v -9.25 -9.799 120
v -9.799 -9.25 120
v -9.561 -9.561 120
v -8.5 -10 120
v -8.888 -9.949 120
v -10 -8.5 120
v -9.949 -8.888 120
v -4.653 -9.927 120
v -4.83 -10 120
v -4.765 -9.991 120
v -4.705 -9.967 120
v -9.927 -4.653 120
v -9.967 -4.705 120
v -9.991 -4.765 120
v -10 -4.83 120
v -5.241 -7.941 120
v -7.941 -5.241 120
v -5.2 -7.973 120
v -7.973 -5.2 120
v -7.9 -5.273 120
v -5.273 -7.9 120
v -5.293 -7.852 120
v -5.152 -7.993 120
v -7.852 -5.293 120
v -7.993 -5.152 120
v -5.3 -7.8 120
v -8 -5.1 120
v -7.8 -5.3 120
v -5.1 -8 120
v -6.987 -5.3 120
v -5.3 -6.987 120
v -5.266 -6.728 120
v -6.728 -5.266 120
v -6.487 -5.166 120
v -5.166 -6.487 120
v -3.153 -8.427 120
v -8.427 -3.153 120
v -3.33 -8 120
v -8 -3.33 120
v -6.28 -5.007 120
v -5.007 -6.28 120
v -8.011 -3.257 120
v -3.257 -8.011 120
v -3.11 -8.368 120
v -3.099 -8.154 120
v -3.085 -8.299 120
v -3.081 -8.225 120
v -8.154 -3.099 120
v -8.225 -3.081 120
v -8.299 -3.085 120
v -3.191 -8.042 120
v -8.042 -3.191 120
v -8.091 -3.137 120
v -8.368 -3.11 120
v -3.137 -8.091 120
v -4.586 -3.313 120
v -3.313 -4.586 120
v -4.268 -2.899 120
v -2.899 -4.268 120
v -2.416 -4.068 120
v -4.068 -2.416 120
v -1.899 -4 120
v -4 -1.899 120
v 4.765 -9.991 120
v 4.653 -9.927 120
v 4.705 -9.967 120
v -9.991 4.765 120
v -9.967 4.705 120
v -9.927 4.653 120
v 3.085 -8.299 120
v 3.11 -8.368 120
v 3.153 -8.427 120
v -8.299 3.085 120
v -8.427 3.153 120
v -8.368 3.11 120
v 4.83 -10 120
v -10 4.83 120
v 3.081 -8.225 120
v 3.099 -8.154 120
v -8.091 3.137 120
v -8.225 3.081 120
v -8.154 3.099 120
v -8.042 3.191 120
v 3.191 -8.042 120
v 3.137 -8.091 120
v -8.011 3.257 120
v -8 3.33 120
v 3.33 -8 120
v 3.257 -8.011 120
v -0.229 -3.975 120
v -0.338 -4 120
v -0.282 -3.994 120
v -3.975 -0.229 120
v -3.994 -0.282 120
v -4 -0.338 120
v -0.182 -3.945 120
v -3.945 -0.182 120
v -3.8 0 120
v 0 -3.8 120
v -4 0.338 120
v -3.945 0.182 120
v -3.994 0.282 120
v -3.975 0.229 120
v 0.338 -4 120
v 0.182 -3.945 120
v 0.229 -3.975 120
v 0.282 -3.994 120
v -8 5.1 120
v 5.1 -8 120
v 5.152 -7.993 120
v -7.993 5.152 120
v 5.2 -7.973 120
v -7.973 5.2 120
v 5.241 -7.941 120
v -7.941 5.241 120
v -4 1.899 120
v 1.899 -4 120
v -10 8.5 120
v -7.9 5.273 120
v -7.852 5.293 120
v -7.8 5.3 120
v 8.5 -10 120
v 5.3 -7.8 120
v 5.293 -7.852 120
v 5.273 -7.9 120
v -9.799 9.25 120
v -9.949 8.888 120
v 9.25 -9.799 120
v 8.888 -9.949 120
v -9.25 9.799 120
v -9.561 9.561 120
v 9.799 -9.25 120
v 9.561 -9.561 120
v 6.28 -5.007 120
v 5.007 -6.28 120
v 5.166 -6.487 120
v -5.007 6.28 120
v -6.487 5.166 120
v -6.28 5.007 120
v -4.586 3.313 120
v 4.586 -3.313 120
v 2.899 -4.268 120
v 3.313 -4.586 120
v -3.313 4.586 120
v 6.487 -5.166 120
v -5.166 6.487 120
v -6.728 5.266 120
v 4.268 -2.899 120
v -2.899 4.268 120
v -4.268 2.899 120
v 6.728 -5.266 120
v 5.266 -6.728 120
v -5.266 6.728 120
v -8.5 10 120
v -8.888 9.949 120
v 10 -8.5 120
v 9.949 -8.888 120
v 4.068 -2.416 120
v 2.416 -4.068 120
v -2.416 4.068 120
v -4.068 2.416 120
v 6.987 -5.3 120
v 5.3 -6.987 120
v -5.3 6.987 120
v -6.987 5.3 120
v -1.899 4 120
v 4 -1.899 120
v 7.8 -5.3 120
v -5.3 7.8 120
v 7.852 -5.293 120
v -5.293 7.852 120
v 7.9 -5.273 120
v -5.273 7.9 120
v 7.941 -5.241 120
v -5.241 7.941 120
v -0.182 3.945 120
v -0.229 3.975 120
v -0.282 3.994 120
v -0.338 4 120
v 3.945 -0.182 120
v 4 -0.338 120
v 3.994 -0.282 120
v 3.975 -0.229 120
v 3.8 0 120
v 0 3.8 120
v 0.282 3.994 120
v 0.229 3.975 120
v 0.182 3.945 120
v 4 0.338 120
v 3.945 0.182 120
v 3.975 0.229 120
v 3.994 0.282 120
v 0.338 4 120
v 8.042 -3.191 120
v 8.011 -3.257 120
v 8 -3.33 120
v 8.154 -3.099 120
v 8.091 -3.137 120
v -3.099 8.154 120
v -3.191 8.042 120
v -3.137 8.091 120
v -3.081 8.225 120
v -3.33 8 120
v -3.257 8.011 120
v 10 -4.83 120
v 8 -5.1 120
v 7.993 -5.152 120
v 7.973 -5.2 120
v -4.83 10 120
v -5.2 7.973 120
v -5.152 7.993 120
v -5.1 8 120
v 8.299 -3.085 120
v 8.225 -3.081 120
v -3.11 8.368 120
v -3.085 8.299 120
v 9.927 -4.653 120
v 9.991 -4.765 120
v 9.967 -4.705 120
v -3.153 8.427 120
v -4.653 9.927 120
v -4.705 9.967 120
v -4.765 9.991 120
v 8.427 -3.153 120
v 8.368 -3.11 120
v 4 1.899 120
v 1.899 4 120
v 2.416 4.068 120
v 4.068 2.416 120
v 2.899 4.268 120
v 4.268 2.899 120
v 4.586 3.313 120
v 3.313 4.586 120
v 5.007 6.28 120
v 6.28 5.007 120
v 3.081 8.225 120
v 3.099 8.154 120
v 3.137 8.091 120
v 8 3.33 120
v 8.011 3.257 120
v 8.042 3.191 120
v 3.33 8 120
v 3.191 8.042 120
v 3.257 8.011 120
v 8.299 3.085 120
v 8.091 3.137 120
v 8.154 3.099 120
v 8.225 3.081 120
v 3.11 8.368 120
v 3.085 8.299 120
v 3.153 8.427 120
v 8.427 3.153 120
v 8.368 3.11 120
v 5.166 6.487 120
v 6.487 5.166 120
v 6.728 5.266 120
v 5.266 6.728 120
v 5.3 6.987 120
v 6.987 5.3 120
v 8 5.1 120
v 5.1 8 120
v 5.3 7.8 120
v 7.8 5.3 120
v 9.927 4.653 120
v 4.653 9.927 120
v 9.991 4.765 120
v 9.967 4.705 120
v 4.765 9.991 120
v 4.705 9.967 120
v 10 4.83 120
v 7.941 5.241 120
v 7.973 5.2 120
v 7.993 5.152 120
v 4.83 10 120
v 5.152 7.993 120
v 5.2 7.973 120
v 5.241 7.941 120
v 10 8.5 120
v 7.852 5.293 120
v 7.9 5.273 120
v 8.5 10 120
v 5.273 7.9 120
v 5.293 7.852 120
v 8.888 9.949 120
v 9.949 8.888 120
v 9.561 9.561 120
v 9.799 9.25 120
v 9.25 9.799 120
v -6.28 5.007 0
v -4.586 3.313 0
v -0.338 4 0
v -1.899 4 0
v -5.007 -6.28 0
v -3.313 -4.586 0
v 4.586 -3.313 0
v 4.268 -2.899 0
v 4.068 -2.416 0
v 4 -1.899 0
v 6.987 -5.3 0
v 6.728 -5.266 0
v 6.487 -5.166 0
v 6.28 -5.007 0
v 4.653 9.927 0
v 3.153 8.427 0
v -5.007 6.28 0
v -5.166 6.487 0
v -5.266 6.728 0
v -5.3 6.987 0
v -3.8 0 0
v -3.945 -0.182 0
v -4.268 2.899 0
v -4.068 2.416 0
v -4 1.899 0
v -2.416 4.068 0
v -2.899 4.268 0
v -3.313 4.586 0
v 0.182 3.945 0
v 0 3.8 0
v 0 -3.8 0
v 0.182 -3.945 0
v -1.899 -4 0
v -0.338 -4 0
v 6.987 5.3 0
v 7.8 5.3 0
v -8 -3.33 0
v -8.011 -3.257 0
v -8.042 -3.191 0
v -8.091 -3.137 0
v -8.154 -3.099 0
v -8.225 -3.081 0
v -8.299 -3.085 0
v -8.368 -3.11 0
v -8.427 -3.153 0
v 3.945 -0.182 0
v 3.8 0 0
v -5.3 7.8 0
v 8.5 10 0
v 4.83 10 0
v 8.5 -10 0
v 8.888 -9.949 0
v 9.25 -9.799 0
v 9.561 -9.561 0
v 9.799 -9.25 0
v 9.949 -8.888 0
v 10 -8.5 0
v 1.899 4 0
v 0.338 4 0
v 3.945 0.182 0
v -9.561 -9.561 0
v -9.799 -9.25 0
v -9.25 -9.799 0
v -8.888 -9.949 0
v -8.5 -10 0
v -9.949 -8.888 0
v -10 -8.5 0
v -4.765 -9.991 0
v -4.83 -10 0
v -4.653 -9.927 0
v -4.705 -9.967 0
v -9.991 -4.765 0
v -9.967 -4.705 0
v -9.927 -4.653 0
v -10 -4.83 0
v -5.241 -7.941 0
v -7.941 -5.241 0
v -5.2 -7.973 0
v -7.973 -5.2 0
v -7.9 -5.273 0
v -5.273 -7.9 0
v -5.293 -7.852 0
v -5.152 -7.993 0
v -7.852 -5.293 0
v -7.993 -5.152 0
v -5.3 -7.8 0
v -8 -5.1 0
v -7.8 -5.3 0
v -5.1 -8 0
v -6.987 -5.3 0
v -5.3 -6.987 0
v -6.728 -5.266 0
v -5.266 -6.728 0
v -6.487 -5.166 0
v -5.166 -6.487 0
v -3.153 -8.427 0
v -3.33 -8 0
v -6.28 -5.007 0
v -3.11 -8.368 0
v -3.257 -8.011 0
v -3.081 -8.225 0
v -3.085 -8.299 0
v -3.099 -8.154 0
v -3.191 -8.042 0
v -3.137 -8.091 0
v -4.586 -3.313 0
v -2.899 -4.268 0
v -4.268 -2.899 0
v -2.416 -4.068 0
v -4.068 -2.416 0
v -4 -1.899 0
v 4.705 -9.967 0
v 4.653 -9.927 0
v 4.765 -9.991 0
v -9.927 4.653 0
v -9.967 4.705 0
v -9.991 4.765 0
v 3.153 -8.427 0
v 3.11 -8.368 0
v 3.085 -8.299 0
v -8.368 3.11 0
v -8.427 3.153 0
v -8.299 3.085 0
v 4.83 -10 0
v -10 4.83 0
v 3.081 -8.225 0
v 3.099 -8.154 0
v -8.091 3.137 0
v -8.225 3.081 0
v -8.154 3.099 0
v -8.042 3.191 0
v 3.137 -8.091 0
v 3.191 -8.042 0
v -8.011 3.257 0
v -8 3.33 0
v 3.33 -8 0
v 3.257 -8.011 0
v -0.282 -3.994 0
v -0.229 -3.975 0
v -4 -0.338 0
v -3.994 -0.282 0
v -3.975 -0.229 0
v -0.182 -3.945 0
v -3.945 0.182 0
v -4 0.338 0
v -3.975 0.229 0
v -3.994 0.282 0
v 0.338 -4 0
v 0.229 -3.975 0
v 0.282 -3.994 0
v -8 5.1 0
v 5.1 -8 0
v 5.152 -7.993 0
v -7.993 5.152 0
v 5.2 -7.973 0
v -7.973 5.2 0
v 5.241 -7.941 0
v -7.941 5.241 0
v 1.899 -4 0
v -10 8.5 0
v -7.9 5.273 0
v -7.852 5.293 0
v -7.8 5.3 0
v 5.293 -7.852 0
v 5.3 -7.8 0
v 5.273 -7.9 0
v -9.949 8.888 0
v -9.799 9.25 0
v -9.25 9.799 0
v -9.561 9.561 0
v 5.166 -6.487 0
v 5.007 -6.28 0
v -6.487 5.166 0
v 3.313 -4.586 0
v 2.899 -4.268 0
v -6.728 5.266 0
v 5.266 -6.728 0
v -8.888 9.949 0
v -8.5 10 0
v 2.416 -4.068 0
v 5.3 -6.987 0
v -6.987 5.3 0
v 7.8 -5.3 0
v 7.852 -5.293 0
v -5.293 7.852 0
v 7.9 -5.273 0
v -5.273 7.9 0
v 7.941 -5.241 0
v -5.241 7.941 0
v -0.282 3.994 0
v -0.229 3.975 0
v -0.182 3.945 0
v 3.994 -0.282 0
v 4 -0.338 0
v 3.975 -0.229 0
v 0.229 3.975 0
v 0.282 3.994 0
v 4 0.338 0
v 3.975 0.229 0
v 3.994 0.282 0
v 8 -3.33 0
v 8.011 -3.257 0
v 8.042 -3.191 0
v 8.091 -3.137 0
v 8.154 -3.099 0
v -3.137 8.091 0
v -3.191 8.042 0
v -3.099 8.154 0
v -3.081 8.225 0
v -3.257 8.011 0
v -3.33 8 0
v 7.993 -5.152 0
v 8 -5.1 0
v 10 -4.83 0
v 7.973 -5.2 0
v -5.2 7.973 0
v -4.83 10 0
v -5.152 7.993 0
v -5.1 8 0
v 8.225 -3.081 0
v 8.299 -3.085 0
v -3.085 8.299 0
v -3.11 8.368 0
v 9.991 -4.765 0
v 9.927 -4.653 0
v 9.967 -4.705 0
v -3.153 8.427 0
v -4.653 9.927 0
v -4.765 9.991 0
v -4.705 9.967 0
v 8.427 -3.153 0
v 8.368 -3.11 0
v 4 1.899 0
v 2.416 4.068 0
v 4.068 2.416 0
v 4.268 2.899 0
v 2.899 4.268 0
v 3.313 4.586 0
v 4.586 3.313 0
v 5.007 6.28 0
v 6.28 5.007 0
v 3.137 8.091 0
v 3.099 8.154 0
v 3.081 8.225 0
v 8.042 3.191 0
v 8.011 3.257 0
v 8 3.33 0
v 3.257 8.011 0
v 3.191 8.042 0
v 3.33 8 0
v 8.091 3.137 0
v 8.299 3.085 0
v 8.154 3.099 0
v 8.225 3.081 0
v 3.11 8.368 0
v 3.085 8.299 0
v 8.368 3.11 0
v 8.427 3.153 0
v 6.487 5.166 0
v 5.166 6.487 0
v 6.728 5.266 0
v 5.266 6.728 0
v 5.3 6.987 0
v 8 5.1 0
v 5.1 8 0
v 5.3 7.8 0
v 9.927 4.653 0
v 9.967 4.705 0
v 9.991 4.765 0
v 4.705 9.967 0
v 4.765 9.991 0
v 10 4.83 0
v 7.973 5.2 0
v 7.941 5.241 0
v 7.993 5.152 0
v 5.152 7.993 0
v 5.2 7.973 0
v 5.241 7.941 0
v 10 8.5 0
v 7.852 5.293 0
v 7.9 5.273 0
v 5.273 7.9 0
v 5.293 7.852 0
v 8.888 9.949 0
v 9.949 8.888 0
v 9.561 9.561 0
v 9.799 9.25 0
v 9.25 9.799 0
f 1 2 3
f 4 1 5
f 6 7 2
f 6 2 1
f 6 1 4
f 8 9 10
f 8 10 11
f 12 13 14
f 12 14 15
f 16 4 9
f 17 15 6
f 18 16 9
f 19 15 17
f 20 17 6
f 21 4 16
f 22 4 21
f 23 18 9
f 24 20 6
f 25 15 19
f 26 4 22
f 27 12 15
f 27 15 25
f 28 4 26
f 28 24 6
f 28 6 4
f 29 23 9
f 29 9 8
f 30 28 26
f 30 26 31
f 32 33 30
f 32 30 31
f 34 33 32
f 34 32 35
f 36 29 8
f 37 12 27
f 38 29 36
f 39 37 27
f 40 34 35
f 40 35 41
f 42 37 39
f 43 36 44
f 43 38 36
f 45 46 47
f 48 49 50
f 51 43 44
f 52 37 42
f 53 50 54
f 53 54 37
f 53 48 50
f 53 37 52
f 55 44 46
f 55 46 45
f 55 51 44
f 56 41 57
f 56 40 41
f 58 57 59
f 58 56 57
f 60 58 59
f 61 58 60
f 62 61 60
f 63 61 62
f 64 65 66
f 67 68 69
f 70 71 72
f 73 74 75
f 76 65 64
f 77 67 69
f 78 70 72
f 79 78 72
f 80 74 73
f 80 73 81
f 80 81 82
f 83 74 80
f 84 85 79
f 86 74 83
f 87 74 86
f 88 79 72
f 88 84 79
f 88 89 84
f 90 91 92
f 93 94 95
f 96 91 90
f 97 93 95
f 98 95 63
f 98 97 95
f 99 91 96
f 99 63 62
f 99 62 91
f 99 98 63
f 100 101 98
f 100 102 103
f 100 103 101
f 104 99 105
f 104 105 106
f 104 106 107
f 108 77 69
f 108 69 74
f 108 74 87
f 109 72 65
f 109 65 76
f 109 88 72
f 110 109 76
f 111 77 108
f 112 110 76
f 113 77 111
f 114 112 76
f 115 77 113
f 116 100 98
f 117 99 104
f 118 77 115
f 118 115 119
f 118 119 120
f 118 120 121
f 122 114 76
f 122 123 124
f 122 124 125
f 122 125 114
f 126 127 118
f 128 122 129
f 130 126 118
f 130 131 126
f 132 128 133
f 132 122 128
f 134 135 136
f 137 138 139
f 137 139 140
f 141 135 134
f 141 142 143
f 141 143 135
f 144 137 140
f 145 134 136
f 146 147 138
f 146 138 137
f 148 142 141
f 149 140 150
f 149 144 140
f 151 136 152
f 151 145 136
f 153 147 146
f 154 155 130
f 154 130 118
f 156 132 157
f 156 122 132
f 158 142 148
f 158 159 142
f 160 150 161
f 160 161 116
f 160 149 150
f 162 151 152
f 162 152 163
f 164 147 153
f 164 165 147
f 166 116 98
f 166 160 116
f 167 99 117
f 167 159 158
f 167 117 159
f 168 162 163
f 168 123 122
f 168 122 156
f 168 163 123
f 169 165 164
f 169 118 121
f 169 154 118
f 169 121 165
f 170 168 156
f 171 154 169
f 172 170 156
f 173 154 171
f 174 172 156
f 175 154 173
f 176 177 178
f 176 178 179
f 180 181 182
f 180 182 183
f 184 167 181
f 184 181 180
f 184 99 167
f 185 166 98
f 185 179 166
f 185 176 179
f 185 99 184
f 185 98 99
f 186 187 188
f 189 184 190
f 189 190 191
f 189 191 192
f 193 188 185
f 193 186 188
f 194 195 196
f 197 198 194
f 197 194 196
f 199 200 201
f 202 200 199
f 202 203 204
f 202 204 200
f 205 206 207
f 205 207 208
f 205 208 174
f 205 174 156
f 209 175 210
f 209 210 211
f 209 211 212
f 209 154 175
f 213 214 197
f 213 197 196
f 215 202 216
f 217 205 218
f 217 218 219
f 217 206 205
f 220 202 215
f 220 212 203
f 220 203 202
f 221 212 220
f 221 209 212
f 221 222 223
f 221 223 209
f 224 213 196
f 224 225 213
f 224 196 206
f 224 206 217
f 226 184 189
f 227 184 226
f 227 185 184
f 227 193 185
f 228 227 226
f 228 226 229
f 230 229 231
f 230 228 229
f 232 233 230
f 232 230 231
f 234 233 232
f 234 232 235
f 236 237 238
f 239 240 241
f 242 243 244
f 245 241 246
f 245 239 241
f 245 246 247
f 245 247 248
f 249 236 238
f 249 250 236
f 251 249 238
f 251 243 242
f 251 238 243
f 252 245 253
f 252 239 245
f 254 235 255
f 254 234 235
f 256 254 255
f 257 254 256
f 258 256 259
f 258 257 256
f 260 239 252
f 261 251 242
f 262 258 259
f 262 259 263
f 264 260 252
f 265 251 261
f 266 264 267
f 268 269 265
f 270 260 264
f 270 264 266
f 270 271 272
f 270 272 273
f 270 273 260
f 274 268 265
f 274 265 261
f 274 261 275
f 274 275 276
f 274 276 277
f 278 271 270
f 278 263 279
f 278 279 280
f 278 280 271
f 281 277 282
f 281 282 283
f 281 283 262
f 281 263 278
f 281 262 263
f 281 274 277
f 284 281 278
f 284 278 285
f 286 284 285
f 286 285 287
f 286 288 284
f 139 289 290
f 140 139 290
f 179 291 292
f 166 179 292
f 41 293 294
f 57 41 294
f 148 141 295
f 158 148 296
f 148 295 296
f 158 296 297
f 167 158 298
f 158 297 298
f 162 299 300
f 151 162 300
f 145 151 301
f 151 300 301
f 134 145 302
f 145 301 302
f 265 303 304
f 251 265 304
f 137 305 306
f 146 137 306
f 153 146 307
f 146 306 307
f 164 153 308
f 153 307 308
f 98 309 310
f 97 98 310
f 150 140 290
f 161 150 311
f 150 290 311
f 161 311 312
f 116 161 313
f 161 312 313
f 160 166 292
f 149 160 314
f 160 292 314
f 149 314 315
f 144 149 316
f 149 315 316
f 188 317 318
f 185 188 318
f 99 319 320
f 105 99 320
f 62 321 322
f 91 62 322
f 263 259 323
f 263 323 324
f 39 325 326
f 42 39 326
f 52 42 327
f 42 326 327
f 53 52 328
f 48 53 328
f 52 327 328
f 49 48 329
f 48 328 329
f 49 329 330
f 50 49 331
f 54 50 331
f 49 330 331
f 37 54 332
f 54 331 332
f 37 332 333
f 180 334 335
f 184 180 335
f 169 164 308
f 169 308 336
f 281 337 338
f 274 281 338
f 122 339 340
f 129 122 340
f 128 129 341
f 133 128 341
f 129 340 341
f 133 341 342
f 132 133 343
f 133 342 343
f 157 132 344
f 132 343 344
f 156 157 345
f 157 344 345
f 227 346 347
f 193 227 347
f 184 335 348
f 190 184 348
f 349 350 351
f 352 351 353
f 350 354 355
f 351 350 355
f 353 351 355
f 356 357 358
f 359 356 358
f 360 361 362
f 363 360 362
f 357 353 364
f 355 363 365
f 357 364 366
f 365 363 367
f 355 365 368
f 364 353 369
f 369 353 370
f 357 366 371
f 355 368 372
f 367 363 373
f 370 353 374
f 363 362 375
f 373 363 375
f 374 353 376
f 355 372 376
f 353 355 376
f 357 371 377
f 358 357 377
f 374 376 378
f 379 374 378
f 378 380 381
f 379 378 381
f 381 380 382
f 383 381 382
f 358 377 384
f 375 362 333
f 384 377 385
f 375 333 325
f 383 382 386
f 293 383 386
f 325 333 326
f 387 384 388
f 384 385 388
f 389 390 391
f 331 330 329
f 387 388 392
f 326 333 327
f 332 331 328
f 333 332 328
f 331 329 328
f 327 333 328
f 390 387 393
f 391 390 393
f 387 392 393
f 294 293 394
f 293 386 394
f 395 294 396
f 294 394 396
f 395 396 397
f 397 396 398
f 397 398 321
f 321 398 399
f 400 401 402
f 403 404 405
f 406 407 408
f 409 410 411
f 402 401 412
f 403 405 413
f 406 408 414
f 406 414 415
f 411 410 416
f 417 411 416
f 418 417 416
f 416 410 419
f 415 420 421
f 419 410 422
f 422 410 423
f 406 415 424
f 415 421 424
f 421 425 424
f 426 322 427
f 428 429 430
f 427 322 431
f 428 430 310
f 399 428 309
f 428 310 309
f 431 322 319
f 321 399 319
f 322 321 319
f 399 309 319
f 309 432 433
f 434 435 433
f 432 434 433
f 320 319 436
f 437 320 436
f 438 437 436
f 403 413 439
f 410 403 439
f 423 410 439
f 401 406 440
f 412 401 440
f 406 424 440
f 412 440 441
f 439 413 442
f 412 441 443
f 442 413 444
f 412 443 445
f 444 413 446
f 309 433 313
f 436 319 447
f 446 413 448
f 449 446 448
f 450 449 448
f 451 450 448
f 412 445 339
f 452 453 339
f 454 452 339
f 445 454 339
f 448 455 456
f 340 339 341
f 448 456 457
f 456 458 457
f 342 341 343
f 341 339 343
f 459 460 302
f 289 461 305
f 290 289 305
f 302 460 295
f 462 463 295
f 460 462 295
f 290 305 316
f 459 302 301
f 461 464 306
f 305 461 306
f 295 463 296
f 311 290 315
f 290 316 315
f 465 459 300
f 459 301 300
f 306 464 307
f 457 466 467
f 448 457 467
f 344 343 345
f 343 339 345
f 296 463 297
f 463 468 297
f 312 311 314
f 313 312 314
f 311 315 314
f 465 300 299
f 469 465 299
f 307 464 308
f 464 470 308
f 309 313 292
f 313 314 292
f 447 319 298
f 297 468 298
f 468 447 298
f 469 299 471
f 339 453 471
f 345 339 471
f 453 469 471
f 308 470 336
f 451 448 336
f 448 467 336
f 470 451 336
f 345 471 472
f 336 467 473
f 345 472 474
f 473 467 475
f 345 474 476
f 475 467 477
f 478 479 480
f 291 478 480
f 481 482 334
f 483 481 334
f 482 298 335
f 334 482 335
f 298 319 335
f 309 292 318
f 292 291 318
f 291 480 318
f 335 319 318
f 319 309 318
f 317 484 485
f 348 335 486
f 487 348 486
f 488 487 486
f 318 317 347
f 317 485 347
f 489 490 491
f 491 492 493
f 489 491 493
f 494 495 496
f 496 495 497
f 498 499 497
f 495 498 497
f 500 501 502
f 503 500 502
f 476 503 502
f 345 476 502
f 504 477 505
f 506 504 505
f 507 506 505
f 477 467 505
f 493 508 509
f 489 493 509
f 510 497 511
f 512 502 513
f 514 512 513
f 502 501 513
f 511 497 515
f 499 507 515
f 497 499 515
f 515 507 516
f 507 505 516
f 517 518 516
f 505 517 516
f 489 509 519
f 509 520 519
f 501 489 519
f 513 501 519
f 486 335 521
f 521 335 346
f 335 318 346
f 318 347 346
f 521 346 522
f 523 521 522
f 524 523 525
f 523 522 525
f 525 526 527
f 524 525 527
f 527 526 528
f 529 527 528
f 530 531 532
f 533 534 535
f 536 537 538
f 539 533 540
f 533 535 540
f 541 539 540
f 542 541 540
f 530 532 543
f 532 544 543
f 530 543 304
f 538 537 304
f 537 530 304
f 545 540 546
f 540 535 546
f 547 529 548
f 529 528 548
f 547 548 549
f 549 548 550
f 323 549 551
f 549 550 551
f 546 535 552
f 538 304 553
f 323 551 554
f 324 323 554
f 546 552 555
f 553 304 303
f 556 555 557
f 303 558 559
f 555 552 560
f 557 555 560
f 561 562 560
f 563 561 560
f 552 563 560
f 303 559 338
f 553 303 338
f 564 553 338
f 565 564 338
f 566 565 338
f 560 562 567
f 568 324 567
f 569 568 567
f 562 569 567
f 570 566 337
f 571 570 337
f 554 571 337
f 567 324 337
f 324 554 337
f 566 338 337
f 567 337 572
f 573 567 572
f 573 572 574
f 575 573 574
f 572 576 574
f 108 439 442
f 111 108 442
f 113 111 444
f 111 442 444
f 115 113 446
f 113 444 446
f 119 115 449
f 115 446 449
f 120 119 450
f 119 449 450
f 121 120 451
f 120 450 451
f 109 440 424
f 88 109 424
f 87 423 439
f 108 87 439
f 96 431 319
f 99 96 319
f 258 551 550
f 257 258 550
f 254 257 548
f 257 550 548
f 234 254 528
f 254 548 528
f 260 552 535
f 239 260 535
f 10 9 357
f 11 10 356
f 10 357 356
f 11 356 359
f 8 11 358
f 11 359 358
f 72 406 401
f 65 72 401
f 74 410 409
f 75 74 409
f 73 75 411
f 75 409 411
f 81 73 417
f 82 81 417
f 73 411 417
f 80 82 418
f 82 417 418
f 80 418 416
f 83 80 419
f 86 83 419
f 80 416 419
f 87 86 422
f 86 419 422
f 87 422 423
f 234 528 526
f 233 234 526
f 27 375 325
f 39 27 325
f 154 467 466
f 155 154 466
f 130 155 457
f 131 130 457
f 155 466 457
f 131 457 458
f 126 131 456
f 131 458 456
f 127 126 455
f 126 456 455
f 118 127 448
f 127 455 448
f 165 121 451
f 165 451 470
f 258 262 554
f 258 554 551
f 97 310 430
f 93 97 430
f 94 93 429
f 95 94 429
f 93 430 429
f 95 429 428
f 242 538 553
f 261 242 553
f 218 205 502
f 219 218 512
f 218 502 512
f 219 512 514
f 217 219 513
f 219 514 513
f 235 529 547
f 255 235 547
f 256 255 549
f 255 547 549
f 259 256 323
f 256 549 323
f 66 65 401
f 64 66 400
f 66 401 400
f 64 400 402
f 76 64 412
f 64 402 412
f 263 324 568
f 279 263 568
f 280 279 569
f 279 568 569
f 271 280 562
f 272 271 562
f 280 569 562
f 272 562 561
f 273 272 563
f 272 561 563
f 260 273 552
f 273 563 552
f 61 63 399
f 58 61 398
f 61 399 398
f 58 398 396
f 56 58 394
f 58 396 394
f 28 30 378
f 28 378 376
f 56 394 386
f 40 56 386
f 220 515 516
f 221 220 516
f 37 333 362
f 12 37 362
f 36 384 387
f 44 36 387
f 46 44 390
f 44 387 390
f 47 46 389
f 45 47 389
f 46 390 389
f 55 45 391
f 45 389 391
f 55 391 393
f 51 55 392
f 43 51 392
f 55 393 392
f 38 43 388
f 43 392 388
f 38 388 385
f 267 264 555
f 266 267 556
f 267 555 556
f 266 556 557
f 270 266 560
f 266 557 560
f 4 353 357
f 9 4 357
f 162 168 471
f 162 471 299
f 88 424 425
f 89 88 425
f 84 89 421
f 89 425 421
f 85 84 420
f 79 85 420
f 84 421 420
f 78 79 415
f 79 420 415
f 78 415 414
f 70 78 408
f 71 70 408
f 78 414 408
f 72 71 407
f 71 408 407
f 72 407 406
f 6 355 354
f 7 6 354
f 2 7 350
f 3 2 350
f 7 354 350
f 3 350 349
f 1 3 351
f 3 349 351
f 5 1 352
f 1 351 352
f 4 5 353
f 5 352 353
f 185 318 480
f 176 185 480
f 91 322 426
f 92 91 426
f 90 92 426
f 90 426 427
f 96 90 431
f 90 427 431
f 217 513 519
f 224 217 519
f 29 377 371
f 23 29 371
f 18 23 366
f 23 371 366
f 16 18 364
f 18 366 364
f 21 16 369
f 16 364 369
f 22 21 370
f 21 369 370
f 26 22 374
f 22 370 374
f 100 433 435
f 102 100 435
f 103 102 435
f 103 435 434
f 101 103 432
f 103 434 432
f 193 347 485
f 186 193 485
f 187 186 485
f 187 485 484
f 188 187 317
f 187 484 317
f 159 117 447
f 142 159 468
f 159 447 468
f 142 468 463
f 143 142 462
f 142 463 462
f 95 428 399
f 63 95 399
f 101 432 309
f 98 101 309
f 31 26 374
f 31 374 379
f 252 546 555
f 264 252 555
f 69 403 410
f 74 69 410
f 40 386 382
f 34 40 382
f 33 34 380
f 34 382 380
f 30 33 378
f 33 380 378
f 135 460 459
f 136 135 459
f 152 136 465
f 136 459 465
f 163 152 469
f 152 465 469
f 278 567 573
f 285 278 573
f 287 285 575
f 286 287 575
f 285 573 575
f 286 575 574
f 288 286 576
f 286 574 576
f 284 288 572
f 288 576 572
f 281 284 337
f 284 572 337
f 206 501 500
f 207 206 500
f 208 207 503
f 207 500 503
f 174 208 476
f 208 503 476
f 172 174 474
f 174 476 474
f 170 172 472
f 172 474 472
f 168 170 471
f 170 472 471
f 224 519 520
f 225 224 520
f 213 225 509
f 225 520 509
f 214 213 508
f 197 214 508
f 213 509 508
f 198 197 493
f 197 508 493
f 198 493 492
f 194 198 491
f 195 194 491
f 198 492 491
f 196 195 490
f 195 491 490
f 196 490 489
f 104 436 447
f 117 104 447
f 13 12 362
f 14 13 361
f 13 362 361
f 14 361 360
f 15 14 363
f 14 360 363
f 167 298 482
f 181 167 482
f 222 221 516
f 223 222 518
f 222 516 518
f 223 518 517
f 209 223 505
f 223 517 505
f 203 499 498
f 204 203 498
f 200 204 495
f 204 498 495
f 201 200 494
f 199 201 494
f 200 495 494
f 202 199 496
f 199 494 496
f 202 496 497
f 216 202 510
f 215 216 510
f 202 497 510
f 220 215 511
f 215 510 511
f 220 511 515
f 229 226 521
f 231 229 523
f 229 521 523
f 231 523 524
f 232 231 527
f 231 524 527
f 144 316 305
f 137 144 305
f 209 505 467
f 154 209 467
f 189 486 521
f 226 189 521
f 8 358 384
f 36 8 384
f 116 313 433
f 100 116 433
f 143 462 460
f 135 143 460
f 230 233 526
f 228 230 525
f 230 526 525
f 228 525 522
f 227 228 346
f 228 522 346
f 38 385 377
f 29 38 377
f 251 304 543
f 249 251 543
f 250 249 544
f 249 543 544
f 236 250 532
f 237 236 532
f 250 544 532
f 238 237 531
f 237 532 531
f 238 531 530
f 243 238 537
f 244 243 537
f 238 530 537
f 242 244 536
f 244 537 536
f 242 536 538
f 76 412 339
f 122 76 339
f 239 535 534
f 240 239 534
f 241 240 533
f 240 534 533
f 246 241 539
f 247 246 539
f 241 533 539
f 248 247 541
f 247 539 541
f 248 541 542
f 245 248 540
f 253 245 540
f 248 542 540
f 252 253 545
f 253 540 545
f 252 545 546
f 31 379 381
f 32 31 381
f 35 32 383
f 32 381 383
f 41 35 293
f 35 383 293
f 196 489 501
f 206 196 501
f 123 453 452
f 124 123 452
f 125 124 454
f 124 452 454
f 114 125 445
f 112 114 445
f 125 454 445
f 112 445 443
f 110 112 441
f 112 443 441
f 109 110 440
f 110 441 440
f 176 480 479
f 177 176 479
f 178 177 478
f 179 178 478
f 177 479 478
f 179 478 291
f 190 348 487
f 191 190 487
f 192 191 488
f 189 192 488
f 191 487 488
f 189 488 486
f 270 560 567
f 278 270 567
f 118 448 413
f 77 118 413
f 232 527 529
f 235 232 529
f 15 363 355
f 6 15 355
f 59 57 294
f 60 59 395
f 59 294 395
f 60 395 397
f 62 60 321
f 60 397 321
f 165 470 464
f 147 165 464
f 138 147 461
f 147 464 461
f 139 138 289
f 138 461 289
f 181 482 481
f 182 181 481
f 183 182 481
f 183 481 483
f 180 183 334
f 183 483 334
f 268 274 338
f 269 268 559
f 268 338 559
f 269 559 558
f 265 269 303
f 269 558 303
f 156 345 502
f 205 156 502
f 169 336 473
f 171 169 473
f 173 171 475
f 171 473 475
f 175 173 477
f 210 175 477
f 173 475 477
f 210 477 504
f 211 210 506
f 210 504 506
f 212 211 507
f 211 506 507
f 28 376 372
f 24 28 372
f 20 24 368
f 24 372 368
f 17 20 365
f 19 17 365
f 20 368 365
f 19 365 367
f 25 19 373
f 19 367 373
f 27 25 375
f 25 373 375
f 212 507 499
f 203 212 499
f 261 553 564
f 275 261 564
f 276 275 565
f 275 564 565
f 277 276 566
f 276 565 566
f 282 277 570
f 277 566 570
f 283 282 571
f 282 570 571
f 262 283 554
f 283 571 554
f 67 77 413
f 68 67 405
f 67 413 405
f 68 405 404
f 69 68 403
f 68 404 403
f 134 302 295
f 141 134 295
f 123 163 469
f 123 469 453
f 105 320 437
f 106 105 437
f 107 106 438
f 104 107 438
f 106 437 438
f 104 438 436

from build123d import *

# Parameters (mm, degrees)
EXTRUDE_1_DEPTH = 120


# Read off the part's stored shape, not the designer's step: 222 Конструкционный профиль 20х20-1-surface1
with BuildPart() as part:
    # Эскиз1 → Бобышка-Вытянуть1 (new body)
    with BuildSketch(Plane.XY):
        with BuildLine():
            Line((-3.945217202, 0.181521503), (-3.8, 0))
            Line((-3.8, 0), (-3.945217202, -0.181521503))
            ThreePointArc((-3.945217202, -0.181521503), (-3.98590708, -0.254943529), (-4, -0.337695265))
            Line((-4, -0.337695265), (-4, -1.898780669))
            ThreePointArc((-4, -1.898780669), (-4.152240935, -2.664147534), (-4.585786438, -3.312994231))
            Line((-4.585786438, -3.312994231), (-6.279898987, -5.007106781))
            ThreePointArc((-6.279898987, -5.007106781), (-6.604322336, -5.223879533), (-6.987005769, -5.3))
            Line((-6.987005769, -5.3), (-7.8, -5.3))
            ThreePointArc((-7.8, -5.3), (-7.941421356, -5.241421356), (-8, -5.1))
            Line((-8, -5.1), (-8, -3.33))
            ThreePointArc((-8, -3.33), (-8.154329142, -3.099030117), (-8.426776695, -3.153223305))
            Line((-8.426776695, -3.153223305), (-9.926776695, -4.653223305))
            ThreePointArc((-9.926776695, -4.653223305), (-9.980969883, -4.734329142), (-10, -4.83))
            Line((-10, -4.83), (-10, -8.5))
            ThreePointArc((-10, -8.5), (-9.560660172, -9.560660172), (-8.5, -10))
            Line((-8.5, -10), (-4.83, -10))
            ThreePointArc((-4.83, -10), (-4.734329142, -9.980969883), (-4.653223305, -9.926776695))
            Line((-4.653223305, -9.926776695), (-3.153223305, -8.426776695))
            ThreePointArc((-3.153223305, -8.426776695), (-3.099030117, -8.154329142), (-3.33, -8))
            Line((-3.33, -8), (-5.1, -8))
            ThreePointArc((-5.1, -8), (-5.241421356, -7.941421356), (-5.3, -7.8))
            Line((-5.3, -7.8), (-5.3, -6.987005769))
            ThreePointArc((-5.3, -6.987005769), (-5.223879533, -6.604322336), (-5.007106781, -6.279898987))
            Line((-5.007106781, -6.279898987), (-3.312994231, -4.585786438))
            ThreePointArc((-3.312994231, -4.585786438), (-2.664147534, -4.152240935), (-1.898780669, -4))
            Line((-1.898780669, -4), (-0.337695265, -4))
            ThreePointArc((-0.337695265, -4), (-0.254943529, -3.98590708), (-0.181521503, -3.945217202))
            Line((-0.181521503, -3.945217202), (0, -3.8))
            Line((0, -3.8), (0.181521503, -3.945217202))
            ThreePointArc((0.181521503, -3.945217202), (0.254943529, -3.98590708), (0.337695265, -4))
            Line((0.337695265, -4), (1.898780669, -4))
            ThreePointArc((1.898780669, -4), (2.664147534, -4.152240935), (3.312994231, -4.585786438))
            Line((3.312994231, -4.585786438), (5.007106781, -6.279898987))
            ThreePointArc((5.007106781, -6.279898987), (5.223879533, -6.604322336), (5.3, -6.987005769))
            Line((5.3, -6.987005769), (5.3, -7.8))
            ThreePointArc((5.3, -7.8), (5.241421356, -7.941421356), (5.1, -8))
            Line((5.1, -8), (3.33, -8))
            ThreePointArc((3.33, -8), (3.099030117, -8.154329142), (3.153223305, -8.426776695))
            Line((3.153223305, -8.426776695), (4.653223305, -9.926776695))
            ThreePointArc((4.653223305, -9.926776695), (4.734329142, -9.980969883), (4.83, -10))
            Line((4.83, -10), (8.5, -10))
            ThreePointArc((8.5, -10), (9.560660172, -9.560660172), (10, -8.5))
            Line((10, -8.5), (10, -4.83))
            ThreePointArc((10, -4.83), (9.980969883, -4.734329142), (9.926776695, -4.653223305))
            Line((9.926776695, -4.653223305), (8.426776695, -3.153223305))
            ThreePointArc((8.426776695, -3.153223305), (8.154329142, -3.099030117), (8, -3.33))
            Line((8, -3.33), (8, -5.1))
            ThreePointArc((8, -5.1), (7.941421356, -5.241421356), (7.8, -5.3))
            Line((7.8, -5.3), (6.987005769, -5.3))
            ThreePointArc((6.987005769, -5.3), (6.604322336, -5.223879533), (6.279898987, -5.007106781))
            Line((6.279898987, -5.007106781), (4.585786438, -3.312994231))
            ThreePointArc((4.585786438, -3.312994231), (4.152240935, -2.664147534), (4, -1.898780669))
            Line((4, -1.898780669), (4, -0.337695265))
            ThreePointArc((4, -0.337695265), (3.98590708, -0.254943529), (3.945217202, -0.181521503))
            Line((3.945217202, -0.181521503), (3.8, 0))
            Line((3.8, 0), (3.945217202, 0.181521503))
            ThreePointArc((3.945217202, 0.181521503), (3.98590708, 0.254943529), (4, 0.337695265))
            Line((4, 0.337695265), (4, 1.898780669))
            ThreePointArc((4, 1.898780669), (4.152240935, 2.664147534), (4.585786438, 3.312994231))
            Line((4.585786438, 3.312994231), (6.279898987, 5.007106781))
            ThreePointArc((6.279898987, 5.007106781), (6.604322336, 5.223879533), (6.987005769, 5.3))
            Line((6.987005769, 5.3), (7.8, 5.3))
            ThreePointArc((7.8, 5.3), (7.941421356, 5.241421356), (8, 5.1))
            Line((8, 5.1), (8, 3.33))
            ThreePointArc((8, 3.33), (8.154329142, 3.099030117), (8.426776695, 3.153223305))
            Line((8.426776695, 3.153223305), (9.926776695, 4.653223305))
            ThreePointArc((9.926776695, 4.653223305), (9.980969883, 4.734329142), (10, 4.83))
            Line((10, 4.83), (10, 8.5))
            ThreePointArc((10, 8.5), (9.560660172, 9.560660172), (8.5, 10))
            Line((8.5, 10), (4.83, 10))
            ThreePointArc((4.83, 10), (4.734329142, 9.980969883), (4.653223305, 9.926776695))
            Line((4.653223305, 9.926776695), (3.153223305, 8.426776695))
            ThreePointArc((3.153223305, 8.426776695), (3.099030117, 8.154329142), (3.33, 8))
            Line((3.33, 8), (5.1, 8))
            ThreePointArc((5.1, 8), (5.241421356, 7.941421356), (5.3, 7.8))
            Line((5.3, 7.8), (5.3, 6.987005769))
            ThreePointArc((5.3, 6.987005769), (5.223879533, 6.604322336), (5.007106781, 6.279898987))
            Line((5.007106781, 6.279898987), (3.312994231, 4.585786438))
            ThreePointArc((3.312994231, 4.585786438), (2.664147534, 4.152240935), (1.898780669, 4))
            Line((1.898780669, 4), (0.337695265, 4))
            ThreePointArc((0.337695265, 4), (0.254943529, 3.98590708), (0.181521503, 3.945217202))
            Line((0.181521503, 3.945217202), (0, 3.8))
            Line((0, 3.8), (-0.181521503, 3.945217202))
            ThreePointArc((-0.181521503, 3.945217202), (-0.254943529, 3.98590708), (-0.337695265, 4))
            Line((-0.337695265, 4), (-1.898780669, 4))
            ThreePointArc((-1.898780669, 4), (-2.664147534, 4.152240935), (-3.312994231, 4.585786438))
            Line((-3.312994231, 4.585786438), (-5.007106781, 6.279898987))
            ThreePointArc((-5.007106781, 6.279898987), (-5.223879533, 6.604322336), (-5.3, 6.987005769))
            Line((-5.3, 6.987005769), (-5.3, 7.8))
            ThreePointArc((-5.3, 7.8), (-5.241421356, 7.941421356), (-5.1, 8))
            Line((-5.1, 8), (-3.33, 8))
            ThreePointArc((-3.33, 8), (-3.099030117, 8.154329142), (-3.153223305, 8.426776695))
            Line((-3.153223305, 8.426776695), (-4.653223305, 9.926776695))
            ThreePointArc((-4.653223305, 9.926776695), (-4.734329142, 9.980969883), (-4.83, 10))
            Line((-4.83, 10), (-8.5, 10))
            ThreePointArc((-8.5, 10), (-9.560660172, 9.560660172), (-10, 8.5))
            Line((-10, 8.5), (-10, 4.83))
            ThreePointArc((-10, 4.83), (-9.980969883, 4.734329142), (-9.926776695, 4.653223305))
            Line((-9.926776695, 4.653223305), (-8.426776695, 3.153223305))
            ThreePointArc((-8.426776695, 3.153223305), (-8.154329142, 3.099030117), (-8, 3.33))
            Line((-8, 3.33), (-8, 5.1))
            ThreePointArc((-8, 5.1), (-7.941421356, 5.241421356), (-7.8, 5.3))
            Line((-7.8, 5.3), (-6.987005769, 5.3))
            ThreePointArc((-6.987005769, 5.3), (-6.604322336, 5.223879533), (-6.279898987, 5.007106781))
            Line((-6.279898987, 5.007106781), (-4.585786438, 3.312994231))
            ThreePointArc((-4.585786438, 3.312994231), (-4.152240935, 2.664147534), (-4, 1.898780669))
            Line((-4, 1.898780669), (-4, 0.337695265))
            ThreePointArc((-4, 0.337695265), (-3.98590708, 0.254943529), (-3.945217202, 0.181521503))
        make_face()
    extrude(amount=EXTRUDE_1_DEPTH)


solid = part.part
